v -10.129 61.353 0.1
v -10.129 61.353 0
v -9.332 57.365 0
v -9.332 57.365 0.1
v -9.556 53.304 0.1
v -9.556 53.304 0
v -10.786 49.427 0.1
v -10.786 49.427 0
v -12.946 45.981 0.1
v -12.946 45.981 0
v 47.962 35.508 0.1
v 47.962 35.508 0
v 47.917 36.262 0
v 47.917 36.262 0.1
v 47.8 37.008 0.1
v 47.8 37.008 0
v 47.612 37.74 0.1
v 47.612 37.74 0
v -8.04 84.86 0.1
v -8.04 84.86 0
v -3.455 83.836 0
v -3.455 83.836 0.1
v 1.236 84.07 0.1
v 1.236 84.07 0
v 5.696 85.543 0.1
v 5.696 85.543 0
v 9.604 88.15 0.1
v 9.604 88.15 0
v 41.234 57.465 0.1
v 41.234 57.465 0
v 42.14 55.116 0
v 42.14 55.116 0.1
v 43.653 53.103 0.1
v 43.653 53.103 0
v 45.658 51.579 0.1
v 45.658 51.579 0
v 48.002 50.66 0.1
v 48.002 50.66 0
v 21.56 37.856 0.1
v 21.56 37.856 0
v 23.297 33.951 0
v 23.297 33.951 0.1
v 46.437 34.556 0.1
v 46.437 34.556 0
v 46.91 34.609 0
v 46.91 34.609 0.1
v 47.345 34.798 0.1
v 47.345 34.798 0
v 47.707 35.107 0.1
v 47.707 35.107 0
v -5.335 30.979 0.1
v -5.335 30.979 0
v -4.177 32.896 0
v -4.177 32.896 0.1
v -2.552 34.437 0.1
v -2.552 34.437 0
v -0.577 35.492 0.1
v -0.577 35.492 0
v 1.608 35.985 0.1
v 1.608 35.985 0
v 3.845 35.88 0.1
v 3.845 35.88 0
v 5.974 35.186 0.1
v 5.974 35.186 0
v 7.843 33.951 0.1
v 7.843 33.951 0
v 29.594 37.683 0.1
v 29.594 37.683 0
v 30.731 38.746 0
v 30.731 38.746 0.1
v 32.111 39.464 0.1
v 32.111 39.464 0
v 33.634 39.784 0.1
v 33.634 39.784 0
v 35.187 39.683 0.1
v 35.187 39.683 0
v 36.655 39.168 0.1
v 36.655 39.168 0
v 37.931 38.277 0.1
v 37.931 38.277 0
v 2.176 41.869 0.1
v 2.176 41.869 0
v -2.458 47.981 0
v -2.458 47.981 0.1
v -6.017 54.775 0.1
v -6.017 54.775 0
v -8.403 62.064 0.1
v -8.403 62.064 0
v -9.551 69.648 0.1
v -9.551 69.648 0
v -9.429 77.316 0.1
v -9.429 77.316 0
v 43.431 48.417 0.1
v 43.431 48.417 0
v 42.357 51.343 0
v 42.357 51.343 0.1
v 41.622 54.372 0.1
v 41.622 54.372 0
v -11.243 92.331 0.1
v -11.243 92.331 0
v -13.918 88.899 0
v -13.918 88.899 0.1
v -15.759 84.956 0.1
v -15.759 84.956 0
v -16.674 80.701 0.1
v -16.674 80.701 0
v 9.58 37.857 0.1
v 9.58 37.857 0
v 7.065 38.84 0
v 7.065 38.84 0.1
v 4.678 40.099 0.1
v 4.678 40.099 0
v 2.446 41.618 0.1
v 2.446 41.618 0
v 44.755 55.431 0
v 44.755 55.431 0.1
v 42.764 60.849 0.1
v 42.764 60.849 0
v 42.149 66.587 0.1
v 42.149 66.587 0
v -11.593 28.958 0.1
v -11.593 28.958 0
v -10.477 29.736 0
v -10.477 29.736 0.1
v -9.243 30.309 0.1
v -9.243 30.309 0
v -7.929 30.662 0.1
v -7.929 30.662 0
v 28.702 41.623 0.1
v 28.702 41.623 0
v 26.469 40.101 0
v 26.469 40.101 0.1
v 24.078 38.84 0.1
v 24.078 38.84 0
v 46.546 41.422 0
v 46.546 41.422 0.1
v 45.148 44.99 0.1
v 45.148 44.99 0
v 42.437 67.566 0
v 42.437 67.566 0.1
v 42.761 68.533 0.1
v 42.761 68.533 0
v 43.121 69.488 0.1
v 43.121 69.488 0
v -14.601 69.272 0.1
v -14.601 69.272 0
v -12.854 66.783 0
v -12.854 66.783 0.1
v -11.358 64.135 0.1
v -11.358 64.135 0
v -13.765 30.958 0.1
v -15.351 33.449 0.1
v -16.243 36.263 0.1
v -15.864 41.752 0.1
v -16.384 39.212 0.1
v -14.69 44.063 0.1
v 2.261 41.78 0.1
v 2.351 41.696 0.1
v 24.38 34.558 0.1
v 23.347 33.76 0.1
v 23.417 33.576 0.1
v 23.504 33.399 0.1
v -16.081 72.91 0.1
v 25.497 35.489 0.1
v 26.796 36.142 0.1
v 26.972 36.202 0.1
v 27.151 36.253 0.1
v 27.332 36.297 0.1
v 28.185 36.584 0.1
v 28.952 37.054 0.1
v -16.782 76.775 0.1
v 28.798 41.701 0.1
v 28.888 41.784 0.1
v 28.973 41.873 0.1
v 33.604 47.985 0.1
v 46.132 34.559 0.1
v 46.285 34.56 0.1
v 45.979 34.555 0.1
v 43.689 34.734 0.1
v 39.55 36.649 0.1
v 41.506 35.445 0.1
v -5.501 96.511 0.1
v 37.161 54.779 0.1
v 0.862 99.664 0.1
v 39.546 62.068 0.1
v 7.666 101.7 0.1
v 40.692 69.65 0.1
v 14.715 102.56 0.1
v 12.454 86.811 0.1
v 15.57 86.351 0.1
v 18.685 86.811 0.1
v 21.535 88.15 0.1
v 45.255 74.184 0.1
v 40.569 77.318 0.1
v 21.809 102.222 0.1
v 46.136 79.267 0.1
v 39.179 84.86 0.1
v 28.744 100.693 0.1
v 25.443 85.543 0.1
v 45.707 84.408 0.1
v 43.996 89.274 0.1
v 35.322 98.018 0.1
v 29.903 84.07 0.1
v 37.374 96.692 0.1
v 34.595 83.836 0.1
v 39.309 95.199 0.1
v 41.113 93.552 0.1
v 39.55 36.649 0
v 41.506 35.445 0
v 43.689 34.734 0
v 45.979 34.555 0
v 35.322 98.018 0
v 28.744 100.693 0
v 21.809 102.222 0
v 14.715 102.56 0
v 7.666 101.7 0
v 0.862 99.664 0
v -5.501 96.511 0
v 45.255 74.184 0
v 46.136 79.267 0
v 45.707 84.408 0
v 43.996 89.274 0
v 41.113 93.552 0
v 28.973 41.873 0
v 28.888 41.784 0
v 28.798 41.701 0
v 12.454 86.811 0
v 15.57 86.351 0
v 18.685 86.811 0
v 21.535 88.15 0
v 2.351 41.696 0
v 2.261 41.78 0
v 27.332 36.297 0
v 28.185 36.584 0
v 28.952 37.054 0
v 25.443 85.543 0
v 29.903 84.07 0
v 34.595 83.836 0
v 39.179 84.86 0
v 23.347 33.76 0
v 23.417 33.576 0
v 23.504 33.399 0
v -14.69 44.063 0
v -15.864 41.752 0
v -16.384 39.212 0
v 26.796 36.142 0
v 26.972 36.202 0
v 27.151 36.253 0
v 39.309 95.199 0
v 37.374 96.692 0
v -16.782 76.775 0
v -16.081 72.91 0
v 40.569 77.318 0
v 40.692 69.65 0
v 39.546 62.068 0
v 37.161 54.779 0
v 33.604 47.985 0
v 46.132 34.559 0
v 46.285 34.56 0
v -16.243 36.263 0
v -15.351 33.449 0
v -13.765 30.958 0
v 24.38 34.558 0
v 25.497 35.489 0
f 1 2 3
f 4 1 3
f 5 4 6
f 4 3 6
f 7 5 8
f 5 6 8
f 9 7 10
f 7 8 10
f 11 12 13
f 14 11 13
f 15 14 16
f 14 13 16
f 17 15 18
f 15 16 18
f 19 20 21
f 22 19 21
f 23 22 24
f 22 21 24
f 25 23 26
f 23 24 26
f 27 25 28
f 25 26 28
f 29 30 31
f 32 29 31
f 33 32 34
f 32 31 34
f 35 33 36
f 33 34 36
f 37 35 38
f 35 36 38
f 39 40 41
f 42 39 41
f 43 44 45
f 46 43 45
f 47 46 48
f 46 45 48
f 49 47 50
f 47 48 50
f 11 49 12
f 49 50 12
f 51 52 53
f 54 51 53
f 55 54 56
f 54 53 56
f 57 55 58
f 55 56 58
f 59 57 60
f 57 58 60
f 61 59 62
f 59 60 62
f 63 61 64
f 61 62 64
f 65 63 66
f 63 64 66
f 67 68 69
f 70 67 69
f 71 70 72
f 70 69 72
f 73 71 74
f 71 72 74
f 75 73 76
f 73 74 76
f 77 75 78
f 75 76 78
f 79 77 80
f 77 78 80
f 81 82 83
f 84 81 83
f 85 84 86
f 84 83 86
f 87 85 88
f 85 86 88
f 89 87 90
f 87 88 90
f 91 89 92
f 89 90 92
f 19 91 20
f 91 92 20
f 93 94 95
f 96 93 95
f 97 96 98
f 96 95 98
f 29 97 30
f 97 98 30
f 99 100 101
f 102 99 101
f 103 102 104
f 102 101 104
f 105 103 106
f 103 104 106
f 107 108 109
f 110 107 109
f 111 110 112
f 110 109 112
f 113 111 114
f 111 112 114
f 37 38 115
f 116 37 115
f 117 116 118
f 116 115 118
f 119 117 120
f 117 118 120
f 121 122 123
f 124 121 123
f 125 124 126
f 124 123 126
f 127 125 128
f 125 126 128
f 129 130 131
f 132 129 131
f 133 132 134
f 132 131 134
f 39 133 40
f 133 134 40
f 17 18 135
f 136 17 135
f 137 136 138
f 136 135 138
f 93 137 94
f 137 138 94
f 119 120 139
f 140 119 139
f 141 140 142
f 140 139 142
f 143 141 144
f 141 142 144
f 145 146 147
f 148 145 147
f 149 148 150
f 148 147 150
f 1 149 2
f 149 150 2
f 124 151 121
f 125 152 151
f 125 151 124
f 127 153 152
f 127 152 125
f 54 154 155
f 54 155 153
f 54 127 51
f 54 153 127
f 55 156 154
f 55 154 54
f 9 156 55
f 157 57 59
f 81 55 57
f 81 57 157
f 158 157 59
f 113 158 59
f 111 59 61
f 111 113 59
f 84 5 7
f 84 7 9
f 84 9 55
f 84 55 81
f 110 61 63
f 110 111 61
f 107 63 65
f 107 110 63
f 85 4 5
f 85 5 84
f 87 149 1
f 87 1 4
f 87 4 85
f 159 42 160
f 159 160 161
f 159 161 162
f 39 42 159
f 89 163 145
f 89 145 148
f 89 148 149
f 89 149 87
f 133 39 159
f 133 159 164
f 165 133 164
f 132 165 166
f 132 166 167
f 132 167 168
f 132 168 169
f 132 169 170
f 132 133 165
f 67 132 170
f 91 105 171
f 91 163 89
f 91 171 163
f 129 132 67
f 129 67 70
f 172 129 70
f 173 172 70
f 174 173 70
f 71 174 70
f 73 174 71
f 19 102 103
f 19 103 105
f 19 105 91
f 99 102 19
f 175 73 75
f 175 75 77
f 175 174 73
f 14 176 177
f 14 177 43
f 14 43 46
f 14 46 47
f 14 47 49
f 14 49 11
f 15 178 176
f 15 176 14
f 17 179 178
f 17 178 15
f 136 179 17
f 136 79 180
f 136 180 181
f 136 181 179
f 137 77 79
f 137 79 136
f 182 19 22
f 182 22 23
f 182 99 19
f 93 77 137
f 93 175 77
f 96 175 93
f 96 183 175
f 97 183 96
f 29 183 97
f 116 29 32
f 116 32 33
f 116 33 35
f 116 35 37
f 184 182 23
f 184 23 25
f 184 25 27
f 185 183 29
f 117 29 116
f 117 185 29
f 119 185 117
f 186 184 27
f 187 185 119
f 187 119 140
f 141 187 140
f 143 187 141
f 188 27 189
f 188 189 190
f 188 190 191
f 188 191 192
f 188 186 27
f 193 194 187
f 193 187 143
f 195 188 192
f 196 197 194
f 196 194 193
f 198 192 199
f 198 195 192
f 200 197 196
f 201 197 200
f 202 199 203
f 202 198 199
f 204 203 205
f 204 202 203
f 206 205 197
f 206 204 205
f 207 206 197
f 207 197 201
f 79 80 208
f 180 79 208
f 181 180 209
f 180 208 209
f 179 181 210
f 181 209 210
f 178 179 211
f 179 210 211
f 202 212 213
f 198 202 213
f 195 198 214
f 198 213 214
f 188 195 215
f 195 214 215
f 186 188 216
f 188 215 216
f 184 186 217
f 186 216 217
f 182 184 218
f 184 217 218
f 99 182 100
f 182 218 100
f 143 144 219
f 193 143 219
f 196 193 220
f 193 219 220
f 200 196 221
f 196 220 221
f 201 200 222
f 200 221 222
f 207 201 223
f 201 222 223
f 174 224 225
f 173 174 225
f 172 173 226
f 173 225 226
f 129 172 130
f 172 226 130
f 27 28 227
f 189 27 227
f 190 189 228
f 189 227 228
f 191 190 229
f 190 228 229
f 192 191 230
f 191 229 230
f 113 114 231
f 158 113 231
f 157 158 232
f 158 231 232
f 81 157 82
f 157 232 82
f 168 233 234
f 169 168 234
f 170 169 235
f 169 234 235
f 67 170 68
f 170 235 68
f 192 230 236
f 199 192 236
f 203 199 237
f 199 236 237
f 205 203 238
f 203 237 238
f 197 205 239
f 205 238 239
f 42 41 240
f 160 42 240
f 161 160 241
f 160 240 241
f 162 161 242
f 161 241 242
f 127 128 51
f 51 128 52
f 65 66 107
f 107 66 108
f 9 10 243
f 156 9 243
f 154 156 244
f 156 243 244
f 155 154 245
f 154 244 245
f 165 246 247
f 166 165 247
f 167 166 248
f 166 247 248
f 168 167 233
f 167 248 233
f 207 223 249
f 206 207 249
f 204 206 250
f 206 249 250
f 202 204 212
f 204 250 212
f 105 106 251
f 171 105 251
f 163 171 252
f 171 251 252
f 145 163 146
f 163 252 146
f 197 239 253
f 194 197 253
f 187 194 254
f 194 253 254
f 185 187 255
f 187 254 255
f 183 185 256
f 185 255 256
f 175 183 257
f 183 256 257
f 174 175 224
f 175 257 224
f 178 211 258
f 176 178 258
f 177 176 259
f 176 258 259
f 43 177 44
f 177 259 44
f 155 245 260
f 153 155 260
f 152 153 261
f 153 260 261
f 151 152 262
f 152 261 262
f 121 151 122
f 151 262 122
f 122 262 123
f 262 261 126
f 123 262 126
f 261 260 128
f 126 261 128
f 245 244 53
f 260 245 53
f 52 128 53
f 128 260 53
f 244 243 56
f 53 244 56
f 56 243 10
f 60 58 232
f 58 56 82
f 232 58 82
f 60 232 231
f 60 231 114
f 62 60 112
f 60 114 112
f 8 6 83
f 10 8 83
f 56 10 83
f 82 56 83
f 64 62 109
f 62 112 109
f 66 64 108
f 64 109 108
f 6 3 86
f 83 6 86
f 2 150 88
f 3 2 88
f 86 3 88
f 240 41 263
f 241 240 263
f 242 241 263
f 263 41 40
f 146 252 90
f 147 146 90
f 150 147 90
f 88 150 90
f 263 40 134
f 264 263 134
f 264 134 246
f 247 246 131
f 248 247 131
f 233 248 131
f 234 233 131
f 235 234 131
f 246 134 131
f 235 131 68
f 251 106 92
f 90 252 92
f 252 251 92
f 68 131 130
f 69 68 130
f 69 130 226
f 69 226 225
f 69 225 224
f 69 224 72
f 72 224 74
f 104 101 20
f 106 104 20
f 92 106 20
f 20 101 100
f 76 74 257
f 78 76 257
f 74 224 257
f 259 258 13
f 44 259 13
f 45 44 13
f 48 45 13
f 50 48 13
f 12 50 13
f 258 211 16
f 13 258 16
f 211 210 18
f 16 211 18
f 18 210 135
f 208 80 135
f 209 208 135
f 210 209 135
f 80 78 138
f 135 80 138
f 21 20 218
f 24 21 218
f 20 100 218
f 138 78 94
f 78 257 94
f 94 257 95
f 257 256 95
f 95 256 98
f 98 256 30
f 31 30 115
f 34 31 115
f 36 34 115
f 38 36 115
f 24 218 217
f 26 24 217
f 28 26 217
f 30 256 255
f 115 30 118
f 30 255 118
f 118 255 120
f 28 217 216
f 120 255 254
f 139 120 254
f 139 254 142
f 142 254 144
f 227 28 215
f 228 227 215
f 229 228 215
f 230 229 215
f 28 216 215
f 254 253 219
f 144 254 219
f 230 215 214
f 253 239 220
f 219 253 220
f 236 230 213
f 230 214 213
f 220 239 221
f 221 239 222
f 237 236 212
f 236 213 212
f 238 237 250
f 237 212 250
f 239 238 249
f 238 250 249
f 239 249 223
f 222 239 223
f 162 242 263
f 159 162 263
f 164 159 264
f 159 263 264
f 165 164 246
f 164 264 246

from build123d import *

# Parameters (mm, degrees)
SALIENTE_EXTRUIR1_DEPTH = 0.1


with BuildPart() as part:
    # Model → Saliente-Extruir1 (new body)
    with BuildSketch(Plane.XY):
        with BuildLine():
            Line((7.842607398, 33.951363828), (9.579734894, 37.856921812))
            ThreePointArc((9.579734894, 37.856921812), (5.853816343, 39.435481261), (2.446469011, 41.618209633))
            ThreePointArc((2.446469011, 41.618209633), (2.30530398, 41.73720898), (2.175714205, 41.868719058))
            ThreePointArc((2.175714205, 41.868719058), (-8.403464325, 62.063986958), (-8.03987526, 84.859505528))
            ThreePointArc((-8.03987526, 84.859505528), (1.236190849, 84.069577534), (9.603788078, 88.150350168))
            ThreePointArc((9.603788078, 88.150350168), (15.569580386, 86.351015884), (21.535340373, 88.150457325))
            ThreePointArc((21.535340373, 88.150457325), (29.9030109, 84.069834991), (39.179062819, 84.859929602))
            ThreePointArc((39.179062819, 84.859929602), (39.545951554, 62.067945489), (28.972930685, 41.873382438))
            ThreePointArc((28.972930685, 41.873382438), (28.843386689, 41.741827264), (28.702263084, 41.622778791))
            ThreePointArc((28.702263084, 41.622778791), (25.291019086, 39.436407853), (21.560299513, 37.855732375))
            Line((21.560299513, 37.855732375), (23.296856275, 33.951104051))
            ThreePointArc((23.296856275, 33.951104051), (23.379782362, 33.667159579), (23.503682681, 33.398552226))
            ThreePointArc((23.503682681, 33.398552226), (24.91201243, 35.055347002), (26.795735375, 36.141601796))
            ThreePointArc((26.795735375, 36.141601796), (27.061156988, 36.22854536), (27.331998678, 36.296755293))
            ThreePointArc((27.331998678, 36.296755293), (28.581463341, 36.797016912), (29.594274303, 37.683378907))
            ThreePointArc((29.594274303, 37.683378907), (33.634090695, 39.784233724), (37.930992822, 38.277469126))
            ThreePointArc((37.930992822, 38.277469126), (41.505714026, 35.445010711), (45.978885302, 34.554959535))
            ThreePointArc((45.978885302, 34.554959535), (46.208146888, 34.559844902), (46.437427714, 34.555966165))
            ThreePointArc((46.437427714, 34.555966165), (47.345458783, 34.798460155), (47.962246093, 35.507612586))
            ThreePointArc((47.962246093, 35.507612586), (47.867291161, 36.636427891), (47.611593039, 37.739994337))
            ThreePointArc((47.611593039, 37.739994337), (45.887992379, 43.222004619), (43.431064267, 48.416880961))
            ThreePointArc((43.431064267, 48.416880961), (41.946296228, 52.847104425), (41.234230474, 57.46493708))
            ThreePointArc((41.234230474, 57.46493708), (43.653110533, 53.102823777), (48.0017493, 50.65980227))
            ThreePointArc((48.0017493, 50.65980227), (43.593122133, 58.078880454), (42.149031339, 66.587306652))
            ThreePointArc((42.149031339, 66.587306652), (42.59469449, 68.050991275), (43.121201087, 69.487577202))
            ThreePointArc((43.121201087, 69.487577202), (46.085206987, 81.850895157), (41.113090097, 93.551964146))
            ThreePointArc((41.113090097, 93.551964146), (38.356950801, 95.965555009), (35.322319177, 98.018049973))
            ThreePointArc((35.322319177, 98.018049973), (11.172182801, 102.279245092), (-11.242648027, 92.331268928))
            ThreePointArc((-11.242648027, 92.331268928), (-14.949595702, 86.979124351), (-16.674221293, 80.701180482))
            ThreePointArc((-16.674221293, 80.701180482), (-16.531478417, 74.824409953), (-14.601116723, 69.271887003))
            ThreePointArc((-14.601116723, 69.271887003), (-12.073727961, 65.477087664), (-10.129040046, 61.353207829))
            ThreePointArc((-10.129040046, 61.353207829), (-9.555595879, 53.303802947), (-12.946389483, 45.980943128))
            ThreePointArc((-12.946389483, 45.980943128), (-15.354439926, 42.946547728), (-16.383842014, 39.212033874))
            ThreePointArc((-16.383842014, 39.212033874), (-15.350532825, 33.44879775), (-11.593101389, 28.958327007))
            ThreePointArc((-11.593101389, 28.958327007), (-9.872267141, 30.049029711), (-7.929133035, 30.661510518))
            Line((-7.929133035, 30.661510518), (-5.334790759, 30.979264145))
            ThreePointArc((-5.334790759, 30.979264145), (0.499105837, 35.811881702), (7.842607398, 33.951363828))
        make_face()
    extrude(amount=SALIENTE_EXTRUIR1_DEPTH)


solid = part.part
